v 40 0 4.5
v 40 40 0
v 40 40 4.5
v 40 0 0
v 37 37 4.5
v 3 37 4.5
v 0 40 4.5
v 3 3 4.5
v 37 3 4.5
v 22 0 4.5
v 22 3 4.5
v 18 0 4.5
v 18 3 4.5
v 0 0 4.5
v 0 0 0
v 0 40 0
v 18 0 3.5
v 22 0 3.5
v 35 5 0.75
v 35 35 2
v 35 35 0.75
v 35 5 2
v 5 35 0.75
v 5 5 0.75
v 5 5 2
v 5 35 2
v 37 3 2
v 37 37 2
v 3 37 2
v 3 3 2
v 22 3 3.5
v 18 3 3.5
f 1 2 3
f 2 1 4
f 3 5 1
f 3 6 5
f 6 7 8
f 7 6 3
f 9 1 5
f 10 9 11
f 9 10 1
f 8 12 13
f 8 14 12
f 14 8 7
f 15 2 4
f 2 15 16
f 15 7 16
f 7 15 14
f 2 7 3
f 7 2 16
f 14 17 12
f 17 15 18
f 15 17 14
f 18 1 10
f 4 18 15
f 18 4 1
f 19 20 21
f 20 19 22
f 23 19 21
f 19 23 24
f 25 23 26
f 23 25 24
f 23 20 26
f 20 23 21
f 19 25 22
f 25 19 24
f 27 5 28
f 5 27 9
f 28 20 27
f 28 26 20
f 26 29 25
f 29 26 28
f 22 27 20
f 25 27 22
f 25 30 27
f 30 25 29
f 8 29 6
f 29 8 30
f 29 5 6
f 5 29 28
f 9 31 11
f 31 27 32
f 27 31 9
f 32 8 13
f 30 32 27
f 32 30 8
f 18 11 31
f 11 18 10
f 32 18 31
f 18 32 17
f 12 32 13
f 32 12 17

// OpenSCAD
$fn=80;

holder_side = 40;
holder_depth = 4.5;

side = 34;
rim = 2;
foot_depth_outer = 2.5;
foot_depth_inner = 3.75;

cable_width = 4;

difference(){
    cube([holder_side, holder_side, holder_depth]);

    // remove inner deeper box
    translate(
        [(holder_side - side+2*rim)/2, 
        (holder_side - side+2*rim)/2, 
        holder_depth - foot_depth_inner]
        ){
            cube([side-2*rim, side-2*rim, foot_depth_inner + 1]);
        }
   
   // remove shelf for foot
    translate(
        [(holder_side - side)/2, 
        (holder_side - side)/2, 
        holder_depth-foot_depth_outer]
        ){
            cube([side, side, foot_depth_inner + 1]);
        }
            
    // remove channel for wires
    translate([(holder_side - cable_width)/2, 0, holder_depth-1])
        {
            cube([cable_width,20, 2]);
        }
}

//translate([rim, rim, 0]){cube([5,5,5]);}
